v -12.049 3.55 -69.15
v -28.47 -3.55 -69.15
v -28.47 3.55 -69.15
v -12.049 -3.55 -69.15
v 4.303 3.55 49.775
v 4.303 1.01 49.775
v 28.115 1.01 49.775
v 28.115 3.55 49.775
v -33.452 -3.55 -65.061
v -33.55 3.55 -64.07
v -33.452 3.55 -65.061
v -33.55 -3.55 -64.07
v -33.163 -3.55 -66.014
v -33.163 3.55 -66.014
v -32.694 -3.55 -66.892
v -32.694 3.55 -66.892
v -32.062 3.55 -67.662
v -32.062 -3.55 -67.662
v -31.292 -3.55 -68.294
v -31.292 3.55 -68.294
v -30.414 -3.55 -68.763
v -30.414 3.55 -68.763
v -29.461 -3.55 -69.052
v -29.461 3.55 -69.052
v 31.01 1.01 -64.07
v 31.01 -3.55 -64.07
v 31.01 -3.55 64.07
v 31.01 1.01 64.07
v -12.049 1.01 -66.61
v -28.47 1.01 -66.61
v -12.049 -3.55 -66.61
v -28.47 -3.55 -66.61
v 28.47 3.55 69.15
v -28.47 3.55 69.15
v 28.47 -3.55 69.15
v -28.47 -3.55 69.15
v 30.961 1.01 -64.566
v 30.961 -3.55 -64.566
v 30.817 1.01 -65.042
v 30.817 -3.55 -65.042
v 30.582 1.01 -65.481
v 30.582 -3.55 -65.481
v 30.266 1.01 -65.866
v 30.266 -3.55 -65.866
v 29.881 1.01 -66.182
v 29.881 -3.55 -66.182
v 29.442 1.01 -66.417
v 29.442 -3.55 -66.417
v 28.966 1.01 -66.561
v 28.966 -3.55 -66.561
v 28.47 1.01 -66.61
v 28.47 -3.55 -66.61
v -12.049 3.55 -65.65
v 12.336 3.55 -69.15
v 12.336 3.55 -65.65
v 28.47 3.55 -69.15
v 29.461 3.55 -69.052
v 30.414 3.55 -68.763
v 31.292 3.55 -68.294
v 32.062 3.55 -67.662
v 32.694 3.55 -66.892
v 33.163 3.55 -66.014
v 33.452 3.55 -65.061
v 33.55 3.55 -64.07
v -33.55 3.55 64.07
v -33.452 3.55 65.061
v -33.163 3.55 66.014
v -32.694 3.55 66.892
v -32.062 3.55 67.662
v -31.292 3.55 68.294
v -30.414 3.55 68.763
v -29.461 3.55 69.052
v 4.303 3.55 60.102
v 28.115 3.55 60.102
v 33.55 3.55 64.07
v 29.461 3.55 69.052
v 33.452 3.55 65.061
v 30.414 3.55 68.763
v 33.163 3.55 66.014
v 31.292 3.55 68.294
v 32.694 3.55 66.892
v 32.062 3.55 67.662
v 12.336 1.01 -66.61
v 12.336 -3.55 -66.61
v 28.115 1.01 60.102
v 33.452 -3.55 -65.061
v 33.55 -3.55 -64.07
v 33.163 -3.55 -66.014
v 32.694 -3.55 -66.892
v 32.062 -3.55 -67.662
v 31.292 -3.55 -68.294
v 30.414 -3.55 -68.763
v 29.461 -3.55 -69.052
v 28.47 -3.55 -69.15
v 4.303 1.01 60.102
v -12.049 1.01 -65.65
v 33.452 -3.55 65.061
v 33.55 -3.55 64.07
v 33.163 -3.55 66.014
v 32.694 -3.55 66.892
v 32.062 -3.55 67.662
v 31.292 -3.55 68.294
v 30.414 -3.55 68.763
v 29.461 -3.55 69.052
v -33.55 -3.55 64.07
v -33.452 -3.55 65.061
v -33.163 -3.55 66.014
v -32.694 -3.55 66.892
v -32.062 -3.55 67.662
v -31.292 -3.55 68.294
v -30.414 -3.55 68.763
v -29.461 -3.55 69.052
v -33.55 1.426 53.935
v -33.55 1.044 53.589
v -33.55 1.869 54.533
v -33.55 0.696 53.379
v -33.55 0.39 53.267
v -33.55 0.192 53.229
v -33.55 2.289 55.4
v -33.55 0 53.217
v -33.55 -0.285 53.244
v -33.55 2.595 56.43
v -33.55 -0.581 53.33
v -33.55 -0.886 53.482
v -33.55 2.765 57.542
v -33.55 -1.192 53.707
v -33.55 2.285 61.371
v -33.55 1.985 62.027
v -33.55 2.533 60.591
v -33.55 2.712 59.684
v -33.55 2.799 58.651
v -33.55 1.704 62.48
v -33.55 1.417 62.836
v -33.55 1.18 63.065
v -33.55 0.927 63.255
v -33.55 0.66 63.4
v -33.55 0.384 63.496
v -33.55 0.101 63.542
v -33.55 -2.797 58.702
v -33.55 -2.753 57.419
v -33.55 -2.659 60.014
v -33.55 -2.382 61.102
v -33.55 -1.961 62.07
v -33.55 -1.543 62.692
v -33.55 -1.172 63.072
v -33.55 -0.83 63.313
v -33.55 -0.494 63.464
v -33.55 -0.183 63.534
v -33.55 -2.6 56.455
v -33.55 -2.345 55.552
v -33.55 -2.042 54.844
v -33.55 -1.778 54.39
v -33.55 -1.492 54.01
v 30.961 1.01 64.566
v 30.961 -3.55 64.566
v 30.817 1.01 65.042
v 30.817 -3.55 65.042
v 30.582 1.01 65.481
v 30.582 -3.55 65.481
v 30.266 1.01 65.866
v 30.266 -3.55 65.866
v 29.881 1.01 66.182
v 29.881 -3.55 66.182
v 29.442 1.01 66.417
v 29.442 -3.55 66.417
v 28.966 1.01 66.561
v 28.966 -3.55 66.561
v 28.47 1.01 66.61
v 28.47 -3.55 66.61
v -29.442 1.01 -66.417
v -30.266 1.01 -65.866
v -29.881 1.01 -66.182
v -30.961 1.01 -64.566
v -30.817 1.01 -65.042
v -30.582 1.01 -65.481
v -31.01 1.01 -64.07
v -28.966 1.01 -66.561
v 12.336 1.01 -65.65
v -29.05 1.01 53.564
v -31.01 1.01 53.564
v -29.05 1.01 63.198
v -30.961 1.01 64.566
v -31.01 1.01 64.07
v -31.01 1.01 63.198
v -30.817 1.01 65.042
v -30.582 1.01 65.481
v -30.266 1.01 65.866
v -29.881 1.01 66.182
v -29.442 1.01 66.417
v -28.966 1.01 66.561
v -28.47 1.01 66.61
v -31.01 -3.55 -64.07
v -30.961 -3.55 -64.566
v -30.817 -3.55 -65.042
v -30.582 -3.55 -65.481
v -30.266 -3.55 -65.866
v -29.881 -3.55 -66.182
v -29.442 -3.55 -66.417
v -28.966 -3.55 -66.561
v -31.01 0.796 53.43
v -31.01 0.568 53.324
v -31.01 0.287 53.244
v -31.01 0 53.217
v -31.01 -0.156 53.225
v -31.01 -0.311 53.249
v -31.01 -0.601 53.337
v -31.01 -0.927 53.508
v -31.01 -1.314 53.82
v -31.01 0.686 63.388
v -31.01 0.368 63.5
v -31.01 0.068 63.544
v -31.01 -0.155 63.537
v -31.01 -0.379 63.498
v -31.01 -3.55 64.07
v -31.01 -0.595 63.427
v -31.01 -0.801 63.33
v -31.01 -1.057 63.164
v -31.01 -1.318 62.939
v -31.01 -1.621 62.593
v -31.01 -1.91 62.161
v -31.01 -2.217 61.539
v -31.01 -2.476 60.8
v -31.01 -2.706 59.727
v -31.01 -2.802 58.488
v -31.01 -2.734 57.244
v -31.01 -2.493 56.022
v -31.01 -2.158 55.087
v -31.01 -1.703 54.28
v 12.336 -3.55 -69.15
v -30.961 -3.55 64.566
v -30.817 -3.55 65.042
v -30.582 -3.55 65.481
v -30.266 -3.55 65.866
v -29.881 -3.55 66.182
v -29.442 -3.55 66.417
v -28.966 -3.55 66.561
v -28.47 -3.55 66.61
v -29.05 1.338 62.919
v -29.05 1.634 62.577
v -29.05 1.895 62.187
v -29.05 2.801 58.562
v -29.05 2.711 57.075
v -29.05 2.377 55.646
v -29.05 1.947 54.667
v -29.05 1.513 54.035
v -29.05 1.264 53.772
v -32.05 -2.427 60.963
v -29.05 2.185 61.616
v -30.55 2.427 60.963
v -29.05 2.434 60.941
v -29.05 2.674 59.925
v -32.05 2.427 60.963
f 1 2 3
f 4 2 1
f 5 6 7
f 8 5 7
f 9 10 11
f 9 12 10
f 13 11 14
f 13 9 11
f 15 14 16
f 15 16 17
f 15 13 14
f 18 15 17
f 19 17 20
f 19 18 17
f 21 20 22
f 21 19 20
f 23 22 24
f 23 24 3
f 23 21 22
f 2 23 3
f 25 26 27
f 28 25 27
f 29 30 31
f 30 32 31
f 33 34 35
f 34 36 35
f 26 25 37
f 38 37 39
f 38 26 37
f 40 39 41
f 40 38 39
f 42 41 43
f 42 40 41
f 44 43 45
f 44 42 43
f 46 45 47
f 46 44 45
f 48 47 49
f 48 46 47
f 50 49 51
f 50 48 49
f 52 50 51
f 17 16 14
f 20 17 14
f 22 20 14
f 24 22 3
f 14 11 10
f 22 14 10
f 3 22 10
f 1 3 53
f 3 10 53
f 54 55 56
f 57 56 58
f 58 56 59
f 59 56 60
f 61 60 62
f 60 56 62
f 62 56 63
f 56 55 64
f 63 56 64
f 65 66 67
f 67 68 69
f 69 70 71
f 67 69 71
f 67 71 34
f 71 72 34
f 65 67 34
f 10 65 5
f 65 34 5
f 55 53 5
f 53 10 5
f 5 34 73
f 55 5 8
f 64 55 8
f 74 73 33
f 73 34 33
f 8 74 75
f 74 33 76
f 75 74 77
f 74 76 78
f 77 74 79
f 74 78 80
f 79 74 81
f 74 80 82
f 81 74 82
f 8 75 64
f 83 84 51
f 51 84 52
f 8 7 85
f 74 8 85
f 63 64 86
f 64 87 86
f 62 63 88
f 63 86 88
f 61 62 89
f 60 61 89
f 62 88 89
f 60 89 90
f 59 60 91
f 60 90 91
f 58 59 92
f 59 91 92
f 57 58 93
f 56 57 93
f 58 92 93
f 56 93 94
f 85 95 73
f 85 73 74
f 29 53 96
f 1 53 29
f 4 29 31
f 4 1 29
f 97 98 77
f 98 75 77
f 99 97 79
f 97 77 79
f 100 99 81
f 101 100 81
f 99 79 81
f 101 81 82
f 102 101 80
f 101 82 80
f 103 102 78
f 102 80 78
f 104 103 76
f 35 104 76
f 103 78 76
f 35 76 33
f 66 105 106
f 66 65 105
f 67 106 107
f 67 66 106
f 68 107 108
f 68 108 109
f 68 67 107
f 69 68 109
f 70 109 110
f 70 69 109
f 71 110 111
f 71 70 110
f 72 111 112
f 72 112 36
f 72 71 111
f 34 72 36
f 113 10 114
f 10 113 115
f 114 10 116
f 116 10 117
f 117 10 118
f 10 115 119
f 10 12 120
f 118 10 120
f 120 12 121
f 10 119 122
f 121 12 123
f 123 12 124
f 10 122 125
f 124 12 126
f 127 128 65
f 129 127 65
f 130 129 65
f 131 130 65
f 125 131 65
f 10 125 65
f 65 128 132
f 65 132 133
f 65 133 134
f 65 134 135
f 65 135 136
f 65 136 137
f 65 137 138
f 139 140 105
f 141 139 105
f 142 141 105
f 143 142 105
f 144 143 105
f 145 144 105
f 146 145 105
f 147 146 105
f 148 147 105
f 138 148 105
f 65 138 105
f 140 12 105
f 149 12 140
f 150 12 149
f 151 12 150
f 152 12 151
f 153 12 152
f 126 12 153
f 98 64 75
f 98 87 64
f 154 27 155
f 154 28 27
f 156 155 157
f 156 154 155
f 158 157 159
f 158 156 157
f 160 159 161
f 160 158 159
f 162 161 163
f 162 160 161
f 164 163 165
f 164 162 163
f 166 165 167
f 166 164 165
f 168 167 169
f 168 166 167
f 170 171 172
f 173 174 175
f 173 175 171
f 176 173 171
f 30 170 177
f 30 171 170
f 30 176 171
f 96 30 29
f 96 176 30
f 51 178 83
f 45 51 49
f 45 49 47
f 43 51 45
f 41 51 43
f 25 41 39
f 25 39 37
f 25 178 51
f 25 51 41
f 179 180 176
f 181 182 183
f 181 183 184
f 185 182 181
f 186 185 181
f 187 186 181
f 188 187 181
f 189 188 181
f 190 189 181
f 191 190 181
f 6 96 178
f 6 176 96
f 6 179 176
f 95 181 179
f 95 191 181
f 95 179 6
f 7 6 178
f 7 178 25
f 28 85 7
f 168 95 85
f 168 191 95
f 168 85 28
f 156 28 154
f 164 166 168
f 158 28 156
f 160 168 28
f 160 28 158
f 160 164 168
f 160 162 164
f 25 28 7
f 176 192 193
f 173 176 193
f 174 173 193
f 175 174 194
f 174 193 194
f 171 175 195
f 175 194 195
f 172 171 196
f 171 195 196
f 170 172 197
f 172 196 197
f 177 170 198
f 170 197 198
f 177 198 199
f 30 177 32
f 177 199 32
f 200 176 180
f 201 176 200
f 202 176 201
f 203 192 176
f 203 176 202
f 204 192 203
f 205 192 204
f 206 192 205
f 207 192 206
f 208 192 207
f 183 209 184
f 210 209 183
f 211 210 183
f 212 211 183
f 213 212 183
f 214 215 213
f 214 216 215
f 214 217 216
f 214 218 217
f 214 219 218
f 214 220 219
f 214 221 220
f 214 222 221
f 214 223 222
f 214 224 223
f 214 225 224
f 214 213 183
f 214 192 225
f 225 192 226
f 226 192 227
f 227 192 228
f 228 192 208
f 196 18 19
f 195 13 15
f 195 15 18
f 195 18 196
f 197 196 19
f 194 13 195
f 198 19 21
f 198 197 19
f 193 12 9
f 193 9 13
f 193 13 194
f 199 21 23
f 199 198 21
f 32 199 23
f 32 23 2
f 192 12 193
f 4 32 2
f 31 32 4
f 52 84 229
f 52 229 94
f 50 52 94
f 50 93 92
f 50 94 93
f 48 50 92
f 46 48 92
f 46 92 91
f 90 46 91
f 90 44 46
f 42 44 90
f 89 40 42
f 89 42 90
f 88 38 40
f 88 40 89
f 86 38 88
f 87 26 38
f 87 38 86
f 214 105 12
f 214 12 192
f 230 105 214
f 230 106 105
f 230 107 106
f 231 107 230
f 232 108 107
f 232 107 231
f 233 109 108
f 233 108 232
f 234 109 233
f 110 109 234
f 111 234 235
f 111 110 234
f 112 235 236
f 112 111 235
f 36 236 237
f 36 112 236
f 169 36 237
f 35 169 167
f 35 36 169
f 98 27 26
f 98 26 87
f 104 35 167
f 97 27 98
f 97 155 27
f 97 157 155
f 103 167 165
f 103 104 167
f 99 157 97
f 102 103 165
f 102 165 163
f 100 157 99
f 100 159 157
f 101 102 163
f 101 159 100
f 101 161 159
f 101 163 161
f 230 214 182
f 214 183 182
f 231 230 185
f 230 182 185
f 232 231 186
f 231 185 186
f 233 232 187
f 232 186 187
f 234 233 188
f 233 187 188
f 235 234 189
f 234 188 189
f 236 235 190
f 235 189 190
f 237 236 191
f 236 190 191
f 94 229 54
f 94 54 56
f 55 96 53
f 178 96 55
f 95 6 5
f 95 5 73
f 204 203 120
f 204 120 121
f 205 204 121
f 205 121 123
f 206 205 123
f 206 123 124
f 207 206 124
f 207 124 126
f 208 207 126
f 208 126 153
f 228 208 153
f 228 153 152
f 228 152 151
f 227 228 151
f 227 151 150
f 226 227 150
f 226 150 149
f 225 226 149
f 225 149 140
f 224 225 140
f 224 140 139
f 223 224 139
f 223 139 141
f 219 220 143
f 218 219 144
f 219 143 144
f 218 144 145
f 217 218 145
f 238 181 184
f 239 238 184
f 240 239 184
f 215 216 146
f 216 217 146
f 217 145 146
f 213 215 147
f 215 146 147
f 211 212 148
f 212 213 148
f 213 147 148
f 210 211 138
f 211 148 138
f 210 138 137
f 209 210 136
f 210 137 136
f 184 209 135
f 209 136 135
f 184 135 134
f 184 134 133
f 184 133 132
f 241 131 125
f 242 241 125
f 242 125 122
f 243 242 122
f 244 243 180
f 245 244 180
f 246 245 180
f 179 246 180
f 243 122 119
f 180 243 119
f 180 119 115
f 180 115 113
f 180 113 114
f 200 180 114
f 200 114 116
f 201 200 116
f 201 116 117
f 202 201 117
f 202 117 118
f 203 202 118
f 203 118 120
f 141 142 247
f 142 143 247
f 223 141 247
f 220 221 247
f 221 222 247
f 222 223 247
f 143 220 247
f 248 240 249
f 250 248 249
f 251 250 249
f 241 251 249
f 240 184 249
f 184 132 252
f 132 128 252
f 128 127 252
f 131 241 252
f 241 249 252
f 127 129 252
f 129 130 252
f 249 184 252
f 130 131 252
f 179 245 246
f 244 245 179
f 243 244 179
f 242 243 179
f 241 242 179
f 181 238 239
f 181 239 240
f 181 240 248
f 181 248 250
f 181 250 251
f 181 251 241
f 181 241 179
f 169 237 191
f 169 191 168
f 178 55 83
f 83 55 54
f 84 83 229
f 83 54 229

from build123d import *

# Parameters (mm, degrees)
F0_W     = 67.1
F0_H     = 138.3
F1_DEPTH = 3.55
F2_R     = 5.08
F3_T     = -2.54
F4_W     = 23.811473
F4_H     = 10.327872
F5_DEPTH = 12.5
F6_W     = 24.385246
F6_H     = 7.1
F7_DEPTH = 3.5
F9_DEPTH = 4.5


with BuildPart() as f1:
    # F0 (on Front) → F1 (new body, symmetric)
    with BuildSketch(Plane.XZ):
        Rectangle(F0_W, F0_H)
    extrude(amount=F1_DEPTH, both=True)

    # F2
    f2_edges = [f1.edges().sort_by_distance(p)[0] for p in [
        (-33.55, 0, 69.15),
        (33.55, 0, 69.15),
        (33.55, 0, -69.15),
        (-33.55, 0, -69.15),
    ]]
    fillet(f2_edges, radius=F2_R)

    # F3
    f3_openings = [f1.faces().sort_by_distance(p)[0] for p in [
        (0, -3.55, 0),
    ]]
    offset(amount=F3_T, openings=f3_openings)

    # F4 (on Front) → F5 (cut, symmetric)
    with BuildSketch(Plane.XZ):
        with Locations((16.209017, 54.938527)):
            Rectangle(F4_W, F4_H)
    extrude(amount=F5_DEPTH, both=True, mode=Mode.SUBTRACT)

    # F6 (on face) → F7 (cut, symmetric)
    with BuildSketch(Plane(origin=(0, 0, -69.15), x_dir=(1, 0, 0), z_dir=(0, 0, -1))):
        with Locations((0.143443, 0)):
            Rectangle(F6_W, F6_H)
    extrude(amount=F7_DEPTH, both=True, mode=Mode.SUBTRACT)

    # F8 (on face) → F9 (cut, symmetric)
    with BuildSketch(Plane(origin=(-33.55, 0, 0), x_dir=(0, -1, 0), z_dir=(-1, 0, 0))):
        with BuildLine():
            add(Edge.make_bspline(
                [(0, 53.217217), (4.854199, 53.217217), (2.427099, 60.963118), (0, 68.70902), (-2.427099, 60.963118), (-4.854199, 53.217217), (0, 53.217217)],
                knots=[0, 0, 0, 2.094395, 2.094395, 4.18879, 4.18879, 6.283185, 6.283185, 6.283185], degree=2, weights=[1, 0.5, 1, 0.5, 1, 0.5, 1]))
        make_face()
    extrude(amount=F9_DEPTH, both=True, mode=Mode.SUBTRACT)


solid = f1.part
